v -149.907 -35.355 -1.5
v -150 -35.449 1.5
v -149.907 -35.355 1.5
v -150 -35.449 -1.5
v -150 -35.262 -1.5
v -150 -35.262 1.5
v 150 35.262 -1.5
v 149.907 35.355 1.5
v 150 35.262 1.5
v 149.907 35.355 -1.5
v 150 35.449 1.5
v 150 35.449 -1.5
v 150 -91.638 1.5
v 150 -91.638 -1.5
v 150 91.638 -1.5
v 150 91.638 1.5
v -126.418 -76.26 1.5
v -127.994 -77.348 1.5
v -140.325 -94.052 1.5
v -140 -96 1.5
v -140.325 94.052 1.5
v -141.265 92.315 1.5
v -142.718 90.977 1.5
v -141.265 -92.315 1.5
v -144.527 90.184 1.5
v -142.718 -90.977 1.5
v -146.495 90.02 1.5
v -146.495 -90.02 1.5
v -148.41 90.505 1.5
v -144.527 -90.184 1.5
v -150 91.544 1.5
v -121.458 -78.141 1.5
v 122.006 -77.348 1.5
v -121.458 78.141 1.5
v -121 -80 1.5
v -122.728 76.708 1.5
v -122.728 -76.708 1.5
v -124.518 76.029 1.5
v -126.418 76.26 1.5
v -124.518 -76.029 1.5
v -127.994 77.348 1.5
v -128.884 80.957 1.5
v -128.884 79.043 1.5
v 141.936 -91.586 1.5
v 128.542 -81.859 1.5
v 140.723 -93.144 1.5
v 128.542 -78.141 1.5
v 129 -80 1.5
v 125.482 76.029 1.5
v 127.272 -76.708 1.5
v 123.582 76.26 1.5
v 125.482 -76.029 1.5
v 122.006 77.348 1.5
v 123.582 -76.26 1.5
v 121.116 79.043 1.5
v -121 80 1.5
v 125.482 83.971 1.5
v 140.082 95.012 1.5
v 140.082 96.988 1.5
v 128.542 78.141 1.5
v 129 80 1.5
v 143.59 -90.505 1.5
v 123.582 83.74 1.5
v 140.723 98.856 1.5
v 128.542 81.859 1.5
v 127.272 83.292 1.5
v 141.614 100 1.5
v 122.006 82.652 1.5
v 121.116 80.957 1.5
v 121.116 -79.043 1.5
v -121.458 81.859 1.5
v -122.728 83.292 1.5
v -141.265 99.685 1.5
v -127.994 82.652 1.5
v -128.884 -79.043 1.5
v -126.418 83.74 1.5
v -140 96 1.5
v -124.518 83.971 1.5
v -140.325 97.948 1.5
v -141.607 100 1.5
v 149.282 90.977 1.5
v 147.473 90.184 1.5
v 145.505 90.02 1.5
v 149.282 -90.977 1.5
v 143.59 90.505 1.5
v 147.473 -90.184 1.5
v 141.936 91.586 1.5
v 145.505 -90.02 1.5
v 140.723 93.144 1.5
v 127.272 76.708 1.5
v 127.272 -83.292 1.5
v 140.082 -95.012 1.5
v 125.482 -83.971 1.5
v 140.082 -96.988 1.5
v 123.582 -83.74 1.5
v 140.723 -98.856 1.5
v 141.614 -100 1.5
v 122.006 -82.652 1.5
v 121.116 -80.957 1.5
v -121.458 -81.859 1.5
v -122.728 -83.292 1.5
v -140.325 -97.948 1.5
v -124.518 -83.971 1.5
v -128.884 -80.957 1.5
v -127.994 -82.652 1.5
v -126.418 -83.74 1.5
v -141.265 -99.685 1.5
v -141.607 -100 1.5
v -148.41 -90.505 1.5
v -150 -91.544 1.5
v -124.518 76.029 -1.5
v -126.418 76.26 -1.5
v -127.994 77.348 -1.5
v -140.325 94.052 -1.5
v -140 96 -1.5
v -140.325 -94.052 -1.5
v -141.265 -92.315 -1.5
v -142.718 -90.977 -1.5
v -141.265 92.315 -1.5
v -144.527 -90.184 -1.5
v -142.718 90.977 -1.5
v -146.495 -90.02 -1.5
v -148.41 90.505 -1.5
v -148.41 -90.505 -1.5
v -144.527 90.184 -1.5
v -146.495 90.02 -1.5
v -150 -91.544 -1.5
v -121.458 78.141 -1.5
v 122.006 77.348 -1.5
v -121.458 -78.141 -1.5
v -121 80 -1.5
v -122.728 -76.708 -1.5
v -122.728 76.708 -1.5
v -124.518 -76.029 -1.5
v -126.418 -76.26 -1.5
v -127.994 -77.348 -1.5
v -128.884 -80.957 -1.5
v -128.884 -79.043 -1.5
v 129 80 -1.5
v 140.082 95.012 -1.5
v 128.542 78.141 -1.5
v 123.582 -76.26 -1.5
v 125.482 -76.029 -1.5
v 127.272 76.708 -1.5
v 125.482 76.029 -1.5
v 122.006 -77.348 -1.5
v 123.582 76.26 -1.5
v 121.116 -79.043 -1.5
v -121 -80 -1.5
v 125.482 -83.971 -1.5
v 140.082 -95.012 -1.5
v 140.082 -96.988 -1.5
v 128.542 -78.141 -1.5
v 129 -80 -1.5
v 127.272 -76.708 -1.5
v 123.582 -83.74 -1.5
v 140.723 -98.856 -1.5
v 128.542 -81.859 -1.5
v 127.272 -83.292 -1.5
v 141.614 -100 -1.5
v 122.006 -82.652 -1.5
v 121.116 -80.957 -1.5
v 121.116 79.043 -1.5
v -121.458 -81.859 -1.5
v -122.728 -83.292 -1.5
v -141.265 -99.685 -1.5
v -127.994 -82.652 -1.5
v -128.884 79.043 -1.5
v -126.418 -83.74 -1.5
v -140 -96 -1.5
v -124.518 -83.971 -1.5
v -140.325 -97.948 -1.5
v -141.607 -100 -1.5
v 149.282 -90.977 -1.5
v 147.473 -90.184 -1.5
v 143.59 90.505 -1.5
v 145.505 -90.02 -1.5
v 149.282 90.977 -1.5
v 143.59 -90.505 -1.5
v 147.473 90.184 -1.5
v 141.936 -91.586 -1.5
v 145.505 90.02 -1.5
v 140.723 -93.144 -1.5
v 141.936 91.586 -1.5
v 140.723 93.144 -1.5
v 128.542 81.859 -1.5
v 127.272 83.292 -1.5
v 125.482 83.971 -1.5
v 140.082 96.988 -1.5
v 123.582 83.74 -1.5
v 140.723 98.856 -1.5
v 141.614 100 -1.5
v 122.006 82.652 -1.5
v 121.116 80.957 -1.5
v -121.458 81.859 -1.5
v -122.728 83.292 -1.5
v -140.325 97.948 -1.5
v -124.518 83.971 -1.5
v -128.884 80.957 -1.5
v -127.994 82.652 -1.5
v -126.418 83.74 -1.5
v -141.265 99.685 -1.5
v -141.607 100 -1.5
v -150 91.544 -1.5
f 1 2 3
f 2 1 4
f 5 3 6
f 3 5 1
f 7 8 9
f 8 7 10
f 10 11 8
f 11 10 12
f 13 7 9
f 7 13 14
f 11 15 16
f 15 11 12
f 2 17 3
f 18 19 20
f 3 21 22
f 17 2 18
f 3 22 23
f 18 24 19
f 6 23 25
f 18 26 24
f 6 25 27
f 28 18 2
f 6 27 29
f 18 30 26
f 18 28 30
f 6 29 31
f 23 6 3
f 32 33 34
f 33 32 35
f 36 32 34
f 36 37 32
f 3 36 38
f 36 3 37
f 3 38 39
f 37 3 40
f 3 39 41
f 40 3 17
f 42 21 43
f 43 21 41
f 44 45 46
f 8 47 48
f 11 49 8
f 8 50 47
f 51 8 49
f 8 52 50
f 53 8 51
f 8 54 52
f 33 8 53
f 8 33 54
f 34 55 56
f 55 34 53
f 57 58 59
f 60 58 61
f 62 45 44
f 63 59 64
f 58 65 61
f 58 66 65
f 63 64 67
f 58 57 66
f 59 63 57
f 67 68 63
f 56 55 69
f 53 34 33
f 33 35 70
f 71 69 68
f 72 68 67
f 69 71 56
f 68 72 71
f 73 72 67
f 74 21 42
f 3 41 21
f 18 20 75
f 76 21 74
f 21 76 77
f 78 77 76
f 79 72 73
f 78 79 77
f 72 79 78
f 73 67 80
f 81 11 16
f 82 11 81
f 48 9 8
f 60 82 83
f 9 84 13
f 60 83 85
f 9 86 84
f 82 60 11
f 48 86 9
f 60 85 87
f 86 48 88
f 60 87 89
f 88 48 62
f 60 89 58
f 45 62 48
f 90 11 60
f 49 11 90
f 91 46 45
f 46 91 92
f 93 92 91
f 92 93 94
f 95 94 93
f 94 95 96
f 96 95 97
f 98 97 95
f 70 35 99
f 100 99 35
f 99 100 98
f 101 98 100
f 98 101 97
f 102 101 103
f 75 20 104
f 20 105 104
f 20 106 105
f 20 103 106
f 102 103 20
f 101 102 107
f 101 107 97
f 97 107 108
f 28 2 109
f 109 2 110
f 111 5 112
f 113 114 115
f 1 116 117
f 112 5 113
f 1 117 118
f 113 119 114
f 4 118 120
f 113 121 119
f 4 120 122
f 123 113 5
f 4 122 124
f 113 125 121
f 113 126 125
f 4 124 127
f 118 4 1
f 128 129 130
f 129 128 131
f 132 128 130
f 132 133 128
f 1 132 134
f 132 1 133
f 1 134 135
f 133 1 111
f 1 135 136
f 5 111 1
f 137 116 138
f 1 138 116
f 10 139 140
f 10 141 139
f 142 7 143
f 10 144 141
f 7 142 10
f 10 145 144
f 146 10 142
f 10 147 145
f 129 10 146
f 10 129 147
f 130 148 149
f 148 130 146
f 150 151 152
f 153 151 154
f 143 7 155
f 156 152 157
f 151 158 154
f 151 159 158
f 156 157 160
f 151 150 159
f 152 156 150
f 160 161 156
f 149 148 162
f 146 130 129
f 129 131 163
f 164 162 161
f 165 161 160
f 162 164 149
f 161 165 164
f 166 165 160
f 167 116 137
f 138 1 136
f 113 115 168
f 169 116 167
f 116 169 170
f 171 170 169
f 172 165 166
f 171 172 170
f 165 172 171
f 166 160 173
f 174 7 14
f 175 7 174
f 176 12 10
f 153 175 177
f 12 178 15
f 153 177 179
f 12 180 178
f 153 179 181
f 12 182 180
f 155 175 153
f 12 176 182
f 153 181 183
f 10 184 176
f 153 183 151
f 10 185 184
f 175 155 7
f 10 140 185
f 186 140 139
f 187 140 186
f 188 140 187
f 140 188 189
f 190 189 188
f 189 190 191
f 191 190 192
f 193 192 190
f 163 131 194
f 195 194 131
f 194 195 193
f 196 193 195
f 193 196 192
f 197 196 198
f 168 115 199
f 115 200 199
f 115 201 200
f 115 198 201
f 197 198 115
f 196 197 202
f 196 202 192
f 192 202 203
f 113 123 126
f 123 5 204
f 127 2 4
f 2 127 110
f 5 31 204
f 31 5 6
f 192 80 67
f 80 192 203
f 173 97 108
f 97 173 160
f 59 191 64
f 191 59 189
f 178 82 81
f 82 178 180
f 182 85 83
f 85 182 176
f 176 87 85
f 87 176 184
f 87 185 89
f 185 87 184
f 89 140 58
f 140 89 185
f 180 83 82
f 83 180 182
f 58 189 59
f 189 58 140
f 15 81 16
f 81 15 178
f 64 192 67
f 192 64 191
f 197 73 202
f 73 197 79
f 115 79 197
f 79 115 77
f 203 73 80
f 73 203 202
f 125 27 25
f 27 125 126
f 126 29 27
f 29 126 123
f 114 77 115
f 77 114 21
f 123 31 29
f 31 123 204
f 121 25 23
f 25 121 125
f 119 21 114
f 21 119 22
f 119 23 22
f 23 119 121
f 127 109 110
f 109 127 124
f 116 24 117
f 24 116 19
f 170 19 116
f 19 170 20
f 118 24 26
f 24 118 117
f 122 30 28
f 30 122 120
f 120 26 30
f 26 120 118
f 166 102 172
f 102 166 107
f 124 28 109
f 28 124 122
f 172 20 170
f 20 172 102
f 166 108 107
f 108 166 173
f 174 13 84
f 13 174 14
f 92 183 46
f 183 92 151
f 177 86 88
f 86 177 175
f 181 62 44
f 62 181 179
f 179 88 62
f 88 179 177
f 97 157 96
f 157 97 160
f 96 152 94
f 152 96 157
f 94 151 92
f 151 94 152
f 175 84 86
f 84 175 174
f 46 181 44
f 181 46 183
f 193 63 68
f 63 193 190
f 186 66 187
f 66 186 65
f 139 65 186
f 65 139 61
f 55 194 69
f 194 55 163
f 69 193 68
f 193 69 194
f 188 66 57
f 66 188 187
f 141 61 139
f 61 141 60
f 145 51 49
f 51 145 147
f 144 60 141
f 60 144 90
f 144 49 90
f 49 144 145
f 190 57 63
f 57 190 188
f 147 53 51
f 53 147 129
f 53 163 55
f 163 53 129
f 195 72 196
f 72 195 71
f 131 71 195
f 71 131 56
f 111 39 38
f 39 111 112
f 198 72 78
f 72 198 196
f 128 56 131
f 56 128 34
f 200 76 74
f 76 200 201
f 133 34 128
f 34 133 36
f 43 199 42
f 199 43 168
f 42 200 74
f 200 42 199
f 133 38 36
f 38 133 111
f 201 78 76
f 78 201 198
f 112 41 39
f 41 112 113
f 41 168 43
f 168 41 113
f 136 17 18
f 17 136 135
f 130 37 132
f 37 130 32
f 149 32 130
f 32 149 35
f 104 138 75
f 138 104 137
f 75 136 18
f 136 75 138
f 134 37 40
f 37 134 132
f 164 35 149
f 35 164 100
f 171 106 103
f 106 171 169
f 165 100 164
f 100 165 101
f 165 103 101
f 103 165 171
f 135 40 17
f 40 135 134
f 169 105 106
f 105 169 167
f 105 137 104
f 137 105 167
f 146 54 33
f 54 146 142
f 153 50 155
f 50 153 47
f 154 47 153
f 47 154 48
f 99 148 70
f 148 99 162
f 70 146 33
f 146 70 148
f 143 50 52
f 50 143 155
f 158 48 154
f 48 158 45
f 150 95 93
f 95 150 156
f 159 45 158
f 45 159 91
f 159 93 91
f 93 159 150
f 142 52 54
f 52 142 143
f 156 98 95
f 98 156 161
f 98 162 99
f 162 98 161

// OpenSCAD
// Parameters
sheet_length = 300; //[150:600:1]
sheet_width = 200; //[100:400:1]
sheet_thickness = 3; //[1.5:6:0.5]
corner_chamfer = 10; //[5:20:1]
corner_round_radius = 6; //[3:12:1]
hole_diameter = 8; //[4:16:0.5]
hole_edge_offset_x = 25; //[12.5:50:1]
hole_edge_offset_y = 20; //[10:40:1]
overlap = 1; //[0.5:2:0.5]

// Base Shapes
module sheet_plate() {
  cube([sheet_length, sheet_width, sheet_thickness], center=true);
}

module corner_chamfer(position) {
  rotate([0, 0, 45])
    translate(position)
      cube([corner_chamfer*2, corner_chamfer*2, sheet_thickness + overlap*2], center=true);
}

module corner_round(position) {
  translate(position)
    cylinder(r=corner_round_radius, h=sheet_thickness + overlap*2, center=true);
}

module mounting_hole(position) {
  translate(position)
    cylinder(r=hole_diameter/2, h=sheet_thickness + overlap*2, center=true);
}

// Operations
module corner_chamfers() {
  union() {
    corner_chamfer([sheet_length/2 - corner_chamfer + overlap, sheet_width/2 - corner_chamfer + overlap, 0]);
    corner_chamfer([-sheet_length/2 + corner_chamfer - overlap, sheet_width/2 - corner_chamfer + overlap, 0]);
    corner_chamfer([-sheet_length/2 + corner_chamfer - overlap, -sheet_width/2 + corner_chamfer - overlap, 0]);
    corner_chamfer([sheet_length/2 - corner_chamfer + overlap, -sheet_width/2 + corner_chamfer - overlap, 0]);
  }
}

module corner_rounds() {
  union() {
    corner_round([sheet_length/2 - corner_chamfer + corner_round_radius, sheet_width/2 - corner_chamfer + corner_round_radius, 0]);
    corner_round([-sheet_length/2 + corner_chamfer - corner_round_radius, sheet_width/2 - corner_chamfer + corner_round_radius, 0]);
    corner_round([-sheet_length/2 + corner_chamfer - corner_round_radius, -sheet_width/2 + corner_chamfer - corner_round_radius, 0]);
    corner_round([sheet_length/2 - corner_chamfer + corner_round_radius, -sheet_width/2 + corner_chamfer - corner_round_radius, 0]);
  }
}

module mounting_holes() {
  union() {
    mounting_hole([sheet_length/2 - hole_edge_offset_x, sheet_width/2 - hole_edge_offset_y, 0]);
    mounting_hole([-sheet_length/2 + hole_edge_offset_x, sheet_width/2 - hole_edge_offset_y, 0]);
    mounting_hole([-sheet_length/2 + hole_edge_offset_x, -sheet_width/2 + hole_edge_offset_y, 0]);
    mounting_hole([sheet_length/2 - hole_edge_offset_x, -sheet_width/2 + hole_edge_offset_y, 0]);
  }
}

// Final Model
difference() {
  difference() {
    difference() {
      sheet_plate();
      corner_chamfers();
    }
    corner_rounds();
  }
  mounting_holes();
}
